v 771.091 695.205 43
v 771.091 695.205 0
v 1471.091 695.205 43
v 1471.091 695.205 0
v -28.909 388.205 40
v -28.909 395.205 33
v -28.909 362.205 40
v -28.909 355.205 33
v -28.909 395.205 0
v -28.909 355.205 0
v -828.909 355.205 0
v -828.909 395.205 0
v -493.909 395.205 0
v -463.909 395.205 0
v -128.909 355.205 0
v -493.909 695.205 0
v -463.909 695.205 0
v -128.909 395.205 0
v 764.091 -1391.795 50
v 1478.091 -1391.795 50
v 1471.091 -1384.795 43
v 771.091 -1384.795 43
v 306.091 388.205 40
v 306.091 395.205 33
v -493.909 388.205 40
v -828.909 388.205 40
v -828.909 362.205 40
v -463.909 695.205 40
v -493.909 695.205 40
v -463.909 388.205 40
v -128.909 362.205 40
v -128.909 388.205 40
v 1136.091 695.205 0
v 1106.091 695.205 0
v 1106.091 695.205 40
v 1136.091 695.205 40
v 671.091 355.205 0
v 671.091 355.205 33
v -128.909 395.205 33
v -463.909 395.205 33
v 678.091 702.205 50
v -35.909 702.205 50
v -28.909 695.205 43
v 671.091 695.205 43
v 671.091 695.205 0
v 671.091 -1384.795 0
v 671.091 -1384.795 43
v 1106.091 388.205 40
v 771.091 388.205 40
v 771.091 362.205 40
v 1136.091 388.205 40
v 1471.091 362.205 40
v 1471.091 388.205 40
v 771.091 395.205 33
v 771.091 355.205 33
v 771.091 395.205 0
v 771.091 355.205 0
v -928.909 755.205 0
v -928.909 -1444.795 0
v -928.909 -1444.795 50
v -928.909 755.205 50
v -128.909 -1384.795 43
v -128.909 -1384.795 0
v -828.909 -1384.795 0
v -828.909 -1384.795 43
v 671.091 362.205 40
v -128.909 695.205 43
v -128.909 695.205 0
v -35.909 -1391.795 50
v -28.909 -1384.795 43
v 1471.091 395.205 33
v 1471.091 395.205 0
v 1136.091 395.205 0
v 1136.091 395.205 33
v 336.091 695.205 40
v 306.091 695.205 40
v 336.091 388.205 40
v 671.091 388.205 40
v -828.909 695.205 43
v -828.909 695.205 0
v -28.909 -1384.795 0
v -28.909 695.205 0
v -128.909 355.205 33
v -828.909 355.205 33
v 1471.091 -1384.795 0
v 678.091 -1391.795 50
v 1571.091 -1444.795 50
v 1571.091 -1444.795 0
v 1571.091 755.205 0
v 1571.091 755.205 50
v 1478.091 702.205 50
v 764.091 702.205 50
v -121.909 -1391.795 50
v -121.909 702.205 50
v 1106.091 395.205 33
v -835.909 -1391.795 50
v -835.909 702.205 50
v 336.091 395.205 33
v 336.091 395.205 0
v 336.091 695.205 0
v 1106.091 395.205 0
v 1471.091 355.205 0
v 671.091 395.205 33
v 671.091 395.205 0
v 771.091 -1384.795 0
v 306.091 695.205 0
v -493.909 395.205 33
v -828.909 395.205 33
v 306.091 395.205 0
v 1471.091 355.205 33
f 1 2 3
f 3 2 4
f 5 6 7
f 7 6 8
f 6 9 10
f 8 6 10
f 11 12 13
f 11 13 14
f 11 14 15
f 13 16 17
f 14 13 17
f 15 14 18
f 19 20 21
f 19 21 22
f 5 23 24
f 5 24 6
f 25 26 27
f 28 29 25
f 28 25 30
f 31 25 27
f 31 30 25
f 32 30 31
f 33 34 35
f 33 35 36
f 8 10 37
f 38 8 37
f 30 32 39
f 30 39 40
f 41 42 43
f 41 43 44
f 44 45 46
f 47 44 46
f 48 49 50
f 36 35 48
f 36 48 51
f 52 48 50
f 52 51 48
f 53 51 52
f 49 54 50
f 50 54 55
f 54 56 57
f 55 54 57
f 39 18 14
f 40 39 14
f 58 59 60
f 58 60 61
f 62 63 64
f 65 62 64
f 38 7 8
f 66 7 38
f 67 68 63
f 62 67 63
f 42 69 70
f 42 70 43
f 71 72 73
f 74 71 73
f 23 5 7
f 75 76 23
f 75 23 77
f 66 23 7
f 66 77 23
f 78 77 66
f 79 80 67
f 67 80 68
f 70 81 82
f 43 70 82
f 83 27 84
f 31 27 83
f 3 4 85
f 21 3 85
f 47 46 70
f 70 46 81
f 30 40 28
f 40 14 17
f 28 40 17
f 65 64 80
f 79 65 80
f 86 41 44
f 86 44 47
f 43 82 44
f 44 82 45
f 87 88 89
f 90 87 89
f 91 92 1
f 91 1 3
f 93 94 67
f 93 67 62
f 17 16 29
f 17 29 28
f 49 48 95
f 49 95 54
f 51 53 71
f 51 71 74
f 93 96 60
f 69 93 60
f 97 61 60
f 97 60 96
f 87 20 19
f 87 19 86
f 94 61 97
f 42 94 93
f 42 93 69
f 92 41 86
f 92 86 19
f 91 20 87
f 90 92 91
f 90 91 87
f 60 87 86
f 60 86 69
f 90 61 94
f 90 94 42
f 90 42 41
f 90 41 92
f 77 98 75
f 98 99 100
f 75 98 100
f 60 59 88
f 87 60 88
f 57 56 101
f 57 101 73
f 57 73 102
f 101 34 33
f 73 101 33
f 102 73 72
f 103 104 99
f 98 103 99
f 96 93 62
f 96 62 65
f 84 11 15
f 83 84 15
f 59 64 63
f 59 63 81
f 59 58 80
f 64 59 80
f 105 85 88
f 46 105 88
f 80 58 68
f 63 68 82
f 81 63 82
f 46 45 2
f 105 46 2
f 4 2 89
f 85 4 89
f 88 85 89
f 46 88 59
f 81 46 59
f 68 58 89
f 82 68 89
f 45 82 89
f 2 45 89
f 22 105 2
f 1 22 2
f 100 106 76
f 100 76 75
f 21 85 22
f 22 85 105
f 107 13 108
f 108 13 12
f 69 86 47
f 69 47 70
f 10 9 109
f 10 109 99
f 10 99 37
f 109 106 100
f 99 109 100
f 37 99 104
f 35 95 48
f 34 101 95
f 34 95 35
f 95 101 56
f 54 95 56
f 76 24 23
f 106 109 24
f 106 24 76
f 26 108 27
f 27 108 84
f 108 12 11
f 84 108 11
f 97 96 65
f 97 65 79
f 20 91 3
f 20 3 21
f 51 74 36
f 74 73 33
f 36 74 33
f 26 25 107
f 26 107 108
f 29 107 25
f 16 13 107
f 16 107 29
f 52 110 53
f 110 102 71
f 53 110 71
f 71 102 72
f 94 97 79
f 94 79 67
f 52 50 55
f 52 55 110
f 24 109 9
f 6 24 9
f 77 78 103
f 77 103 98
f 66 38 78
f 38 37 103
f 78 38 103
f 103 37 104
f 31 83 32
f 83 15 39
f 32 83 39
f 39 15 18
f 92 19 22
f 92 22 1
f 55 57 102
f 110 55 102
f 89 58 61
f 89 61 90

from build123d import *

# Parameters (mm, degrees)
F0_W      = 2500
F0_H      = 2200
F1_DEPTH  = 50
F0_W_2    = 30
F0_H_2    = 300
F2_DEPTH  = 40
F3_SIZE   = 7
F3_2_SIZE = 7
F3_3_SIZE = 7
F3_4_SIZE = 7


# Not quite as in the source:
# - a feature names something its author has since deleted; it is built from what else it names


with BuildPart() as f1:
    # F0 (on Top) → F1 (new body)
    with BuildSketch(Plane.XY):
        with Locations((321.0913794215, -344.7952681527)):
            Rectangle(F0_W, F0_H)
        Polygon((-828.9086205785, 395.2047318473), (-828.9086205785, 695.2047318473), (-493.9086205785, 695.2047318473), (-463.9086205785, 695.2047318473), (-128.9086205785, 695.2047318473), (-28.9086205785, 695.2047318473), (306.0913794215, 695.2047318473), (336.0913794215, 695.2047318473), (671.0913794215, 695.2047318473), (771.0913794215, 695.2047318473), (1106.0913794215, 695.2047318473), (1136.0913794215, 695.2047318473), (1471.0913794215, 695.2047318473), (1471.0913794215, 395.2047318473), (1471.0913794215, 355.2047318473), (1471.0913794215, -1384.7952681527), (771.0913794215, -1384.7952681527), (671.0913794215, -1384.7952681527), (-28.9086205785, -1384.7952681527), (-128.9086205785, -1384.7952681527), (-828.9086205785, -1384.7952681527), (-828.9086205785, 355.2047318473), align=None, mode=Mode.SUBTRACT)
        Polygon((-28.9086205785, 695.2047318473), (-128.9086205785, 695.2047318473), (-128.9086205785, 395.2047318473), (-128.9086205785, 355.2047318473), (-128.9086205785, -1384.7952681527), (-28.9086205785, -1384.7952681527), (-28.9086205785, 355.2047318473), (-28.9086205785, 395.2047318473), align=None)
        Polygon((671.0913794215, 355.2047318473), (671.0913794215, -1384.7952681527), (771.0913794215, -1384.7952681527), (771.0913794215, 355.2047318473), (771.0913794215, 395.2047318473), (771.0913794215, 695.2047318473), (671.0913794215, 695.2047318473), (671.0913794215, 395.2047318473), align=None)
    extrude(amount=F1_DEPTH)

    # F3
    f3_edges = [f1.edges().sort_by_distance(p)[0] for p in [
        (-828.908621, -344.795268, 50),
        (-478.908621, 695.204732, 50),
        (-128.908621, -344.795268, 50),
        (-28.908621, -344.795268, 50),
        (321.091379, 695.204732, 50),
        (771.091379, -344.795268, 50),
        (1121.091379, 695.204732, 50),
        (671.091379, -344.795268, 50),
        (1471.091379, -344.795268, 50),
        (321.091379, -1384.795268, 50),
        (1121.091379, -1384.795268, 50),
        (-478.908621, -1384.795268, 50),
    ]]
    chamfer(f3_edges, length=F3_SIZE)


with BuildPart() as f2:
    # F0 (on Top) → F2 (new body)
    with BuildSketch(Plane.XY):
        Polygon((-493.9086205785, 395.2047318473), (-828.9086205785, 395.2047318473), (-828.9086205785, 355.2047318473), (-128.9086205785, 355.2047318473), (-128.9086205785, 395.2047318473), (-463.9086205785, 395.2047318473), align=None)
        with Locations((-478.9086205785, 545.2047318473)):
            Rectangle(F0_W_2, F0_H_2)
    extrude(amount=F2_DEPTH)

    # F3#2
    f3_2_edges = [f2.edges().sort_by_distance(p)[0] for p in [
        (-478.908621, 355.204732, 40),
        (-661.408621, 395.204732, 40),
        (-296.408621, 395.204732, 40),
    ]]
    chamfer(f3_2_edges, length=F3_2_SIZE)


with BuildPart() as f2b:
    # F0 (on Top) → F2, piece 2 (new body)
    with BuildSketch(Plane.XY):
        Polygon((306.0913794215, 395.2047318473), (-28.9086205785, 395.2047318473), (-28.9086205785, 355.2047318473), (671.0913794215, 355.2047318473), (671.0913794215, 395.2047318473), (336.0913794215, 395.2047318473), align=None)
        with Locations((321.0913794215, 545.2047318473)):
            Rectangle(F0_W_2, F0_H_2)
    extrude(amount=F2_DEPTH)

    # F3#3
    f3_3_edges = [f2b.edges().sort_by_distance(p)[0] for p in [
        (321.091379, 355.204732, 40),
        (138.591379, 395.204732, 40),
        (503.591379, 395.204732, 40),
    ]]
    chamfer(f3_3_edges, length=F3_3_SIZE)


with BuildPart() as f2c:
    # F0 (on Top) → F2, piece 3 (new body)
    with BuildSketch(Plane.XY):
        Polygon((771.0913794215, 395.2047318473), (771.0913794215, 355.2047318473), (1471.0913794215, 355.2047318473), (1471.0913794215, 395.2047318473), (1136.0913794215, 395.2047318473), (1106.0913794215, 395.2047318473), align=None)
        with Locations((1121.0913794215, 545.2047318473)):
            Rectangle(F0_W_2, F0_H_2)
    extrude(amount=F2_DEPTH)

    # F3#4
    f3_4_edges = [f2c.edges().sort_by_distance(p)[0] for p in [
        (1303.591379, 395.204732, 40),
        (938.591379, 395.204732, 40),
        (1121.091379, 355.204732, 40),
    ]]
    chamfer(f3_4_edges, length=F3_4_SIZE)


solid = Compound([f1.part, f2.part, f2b.part, f2c.part])
